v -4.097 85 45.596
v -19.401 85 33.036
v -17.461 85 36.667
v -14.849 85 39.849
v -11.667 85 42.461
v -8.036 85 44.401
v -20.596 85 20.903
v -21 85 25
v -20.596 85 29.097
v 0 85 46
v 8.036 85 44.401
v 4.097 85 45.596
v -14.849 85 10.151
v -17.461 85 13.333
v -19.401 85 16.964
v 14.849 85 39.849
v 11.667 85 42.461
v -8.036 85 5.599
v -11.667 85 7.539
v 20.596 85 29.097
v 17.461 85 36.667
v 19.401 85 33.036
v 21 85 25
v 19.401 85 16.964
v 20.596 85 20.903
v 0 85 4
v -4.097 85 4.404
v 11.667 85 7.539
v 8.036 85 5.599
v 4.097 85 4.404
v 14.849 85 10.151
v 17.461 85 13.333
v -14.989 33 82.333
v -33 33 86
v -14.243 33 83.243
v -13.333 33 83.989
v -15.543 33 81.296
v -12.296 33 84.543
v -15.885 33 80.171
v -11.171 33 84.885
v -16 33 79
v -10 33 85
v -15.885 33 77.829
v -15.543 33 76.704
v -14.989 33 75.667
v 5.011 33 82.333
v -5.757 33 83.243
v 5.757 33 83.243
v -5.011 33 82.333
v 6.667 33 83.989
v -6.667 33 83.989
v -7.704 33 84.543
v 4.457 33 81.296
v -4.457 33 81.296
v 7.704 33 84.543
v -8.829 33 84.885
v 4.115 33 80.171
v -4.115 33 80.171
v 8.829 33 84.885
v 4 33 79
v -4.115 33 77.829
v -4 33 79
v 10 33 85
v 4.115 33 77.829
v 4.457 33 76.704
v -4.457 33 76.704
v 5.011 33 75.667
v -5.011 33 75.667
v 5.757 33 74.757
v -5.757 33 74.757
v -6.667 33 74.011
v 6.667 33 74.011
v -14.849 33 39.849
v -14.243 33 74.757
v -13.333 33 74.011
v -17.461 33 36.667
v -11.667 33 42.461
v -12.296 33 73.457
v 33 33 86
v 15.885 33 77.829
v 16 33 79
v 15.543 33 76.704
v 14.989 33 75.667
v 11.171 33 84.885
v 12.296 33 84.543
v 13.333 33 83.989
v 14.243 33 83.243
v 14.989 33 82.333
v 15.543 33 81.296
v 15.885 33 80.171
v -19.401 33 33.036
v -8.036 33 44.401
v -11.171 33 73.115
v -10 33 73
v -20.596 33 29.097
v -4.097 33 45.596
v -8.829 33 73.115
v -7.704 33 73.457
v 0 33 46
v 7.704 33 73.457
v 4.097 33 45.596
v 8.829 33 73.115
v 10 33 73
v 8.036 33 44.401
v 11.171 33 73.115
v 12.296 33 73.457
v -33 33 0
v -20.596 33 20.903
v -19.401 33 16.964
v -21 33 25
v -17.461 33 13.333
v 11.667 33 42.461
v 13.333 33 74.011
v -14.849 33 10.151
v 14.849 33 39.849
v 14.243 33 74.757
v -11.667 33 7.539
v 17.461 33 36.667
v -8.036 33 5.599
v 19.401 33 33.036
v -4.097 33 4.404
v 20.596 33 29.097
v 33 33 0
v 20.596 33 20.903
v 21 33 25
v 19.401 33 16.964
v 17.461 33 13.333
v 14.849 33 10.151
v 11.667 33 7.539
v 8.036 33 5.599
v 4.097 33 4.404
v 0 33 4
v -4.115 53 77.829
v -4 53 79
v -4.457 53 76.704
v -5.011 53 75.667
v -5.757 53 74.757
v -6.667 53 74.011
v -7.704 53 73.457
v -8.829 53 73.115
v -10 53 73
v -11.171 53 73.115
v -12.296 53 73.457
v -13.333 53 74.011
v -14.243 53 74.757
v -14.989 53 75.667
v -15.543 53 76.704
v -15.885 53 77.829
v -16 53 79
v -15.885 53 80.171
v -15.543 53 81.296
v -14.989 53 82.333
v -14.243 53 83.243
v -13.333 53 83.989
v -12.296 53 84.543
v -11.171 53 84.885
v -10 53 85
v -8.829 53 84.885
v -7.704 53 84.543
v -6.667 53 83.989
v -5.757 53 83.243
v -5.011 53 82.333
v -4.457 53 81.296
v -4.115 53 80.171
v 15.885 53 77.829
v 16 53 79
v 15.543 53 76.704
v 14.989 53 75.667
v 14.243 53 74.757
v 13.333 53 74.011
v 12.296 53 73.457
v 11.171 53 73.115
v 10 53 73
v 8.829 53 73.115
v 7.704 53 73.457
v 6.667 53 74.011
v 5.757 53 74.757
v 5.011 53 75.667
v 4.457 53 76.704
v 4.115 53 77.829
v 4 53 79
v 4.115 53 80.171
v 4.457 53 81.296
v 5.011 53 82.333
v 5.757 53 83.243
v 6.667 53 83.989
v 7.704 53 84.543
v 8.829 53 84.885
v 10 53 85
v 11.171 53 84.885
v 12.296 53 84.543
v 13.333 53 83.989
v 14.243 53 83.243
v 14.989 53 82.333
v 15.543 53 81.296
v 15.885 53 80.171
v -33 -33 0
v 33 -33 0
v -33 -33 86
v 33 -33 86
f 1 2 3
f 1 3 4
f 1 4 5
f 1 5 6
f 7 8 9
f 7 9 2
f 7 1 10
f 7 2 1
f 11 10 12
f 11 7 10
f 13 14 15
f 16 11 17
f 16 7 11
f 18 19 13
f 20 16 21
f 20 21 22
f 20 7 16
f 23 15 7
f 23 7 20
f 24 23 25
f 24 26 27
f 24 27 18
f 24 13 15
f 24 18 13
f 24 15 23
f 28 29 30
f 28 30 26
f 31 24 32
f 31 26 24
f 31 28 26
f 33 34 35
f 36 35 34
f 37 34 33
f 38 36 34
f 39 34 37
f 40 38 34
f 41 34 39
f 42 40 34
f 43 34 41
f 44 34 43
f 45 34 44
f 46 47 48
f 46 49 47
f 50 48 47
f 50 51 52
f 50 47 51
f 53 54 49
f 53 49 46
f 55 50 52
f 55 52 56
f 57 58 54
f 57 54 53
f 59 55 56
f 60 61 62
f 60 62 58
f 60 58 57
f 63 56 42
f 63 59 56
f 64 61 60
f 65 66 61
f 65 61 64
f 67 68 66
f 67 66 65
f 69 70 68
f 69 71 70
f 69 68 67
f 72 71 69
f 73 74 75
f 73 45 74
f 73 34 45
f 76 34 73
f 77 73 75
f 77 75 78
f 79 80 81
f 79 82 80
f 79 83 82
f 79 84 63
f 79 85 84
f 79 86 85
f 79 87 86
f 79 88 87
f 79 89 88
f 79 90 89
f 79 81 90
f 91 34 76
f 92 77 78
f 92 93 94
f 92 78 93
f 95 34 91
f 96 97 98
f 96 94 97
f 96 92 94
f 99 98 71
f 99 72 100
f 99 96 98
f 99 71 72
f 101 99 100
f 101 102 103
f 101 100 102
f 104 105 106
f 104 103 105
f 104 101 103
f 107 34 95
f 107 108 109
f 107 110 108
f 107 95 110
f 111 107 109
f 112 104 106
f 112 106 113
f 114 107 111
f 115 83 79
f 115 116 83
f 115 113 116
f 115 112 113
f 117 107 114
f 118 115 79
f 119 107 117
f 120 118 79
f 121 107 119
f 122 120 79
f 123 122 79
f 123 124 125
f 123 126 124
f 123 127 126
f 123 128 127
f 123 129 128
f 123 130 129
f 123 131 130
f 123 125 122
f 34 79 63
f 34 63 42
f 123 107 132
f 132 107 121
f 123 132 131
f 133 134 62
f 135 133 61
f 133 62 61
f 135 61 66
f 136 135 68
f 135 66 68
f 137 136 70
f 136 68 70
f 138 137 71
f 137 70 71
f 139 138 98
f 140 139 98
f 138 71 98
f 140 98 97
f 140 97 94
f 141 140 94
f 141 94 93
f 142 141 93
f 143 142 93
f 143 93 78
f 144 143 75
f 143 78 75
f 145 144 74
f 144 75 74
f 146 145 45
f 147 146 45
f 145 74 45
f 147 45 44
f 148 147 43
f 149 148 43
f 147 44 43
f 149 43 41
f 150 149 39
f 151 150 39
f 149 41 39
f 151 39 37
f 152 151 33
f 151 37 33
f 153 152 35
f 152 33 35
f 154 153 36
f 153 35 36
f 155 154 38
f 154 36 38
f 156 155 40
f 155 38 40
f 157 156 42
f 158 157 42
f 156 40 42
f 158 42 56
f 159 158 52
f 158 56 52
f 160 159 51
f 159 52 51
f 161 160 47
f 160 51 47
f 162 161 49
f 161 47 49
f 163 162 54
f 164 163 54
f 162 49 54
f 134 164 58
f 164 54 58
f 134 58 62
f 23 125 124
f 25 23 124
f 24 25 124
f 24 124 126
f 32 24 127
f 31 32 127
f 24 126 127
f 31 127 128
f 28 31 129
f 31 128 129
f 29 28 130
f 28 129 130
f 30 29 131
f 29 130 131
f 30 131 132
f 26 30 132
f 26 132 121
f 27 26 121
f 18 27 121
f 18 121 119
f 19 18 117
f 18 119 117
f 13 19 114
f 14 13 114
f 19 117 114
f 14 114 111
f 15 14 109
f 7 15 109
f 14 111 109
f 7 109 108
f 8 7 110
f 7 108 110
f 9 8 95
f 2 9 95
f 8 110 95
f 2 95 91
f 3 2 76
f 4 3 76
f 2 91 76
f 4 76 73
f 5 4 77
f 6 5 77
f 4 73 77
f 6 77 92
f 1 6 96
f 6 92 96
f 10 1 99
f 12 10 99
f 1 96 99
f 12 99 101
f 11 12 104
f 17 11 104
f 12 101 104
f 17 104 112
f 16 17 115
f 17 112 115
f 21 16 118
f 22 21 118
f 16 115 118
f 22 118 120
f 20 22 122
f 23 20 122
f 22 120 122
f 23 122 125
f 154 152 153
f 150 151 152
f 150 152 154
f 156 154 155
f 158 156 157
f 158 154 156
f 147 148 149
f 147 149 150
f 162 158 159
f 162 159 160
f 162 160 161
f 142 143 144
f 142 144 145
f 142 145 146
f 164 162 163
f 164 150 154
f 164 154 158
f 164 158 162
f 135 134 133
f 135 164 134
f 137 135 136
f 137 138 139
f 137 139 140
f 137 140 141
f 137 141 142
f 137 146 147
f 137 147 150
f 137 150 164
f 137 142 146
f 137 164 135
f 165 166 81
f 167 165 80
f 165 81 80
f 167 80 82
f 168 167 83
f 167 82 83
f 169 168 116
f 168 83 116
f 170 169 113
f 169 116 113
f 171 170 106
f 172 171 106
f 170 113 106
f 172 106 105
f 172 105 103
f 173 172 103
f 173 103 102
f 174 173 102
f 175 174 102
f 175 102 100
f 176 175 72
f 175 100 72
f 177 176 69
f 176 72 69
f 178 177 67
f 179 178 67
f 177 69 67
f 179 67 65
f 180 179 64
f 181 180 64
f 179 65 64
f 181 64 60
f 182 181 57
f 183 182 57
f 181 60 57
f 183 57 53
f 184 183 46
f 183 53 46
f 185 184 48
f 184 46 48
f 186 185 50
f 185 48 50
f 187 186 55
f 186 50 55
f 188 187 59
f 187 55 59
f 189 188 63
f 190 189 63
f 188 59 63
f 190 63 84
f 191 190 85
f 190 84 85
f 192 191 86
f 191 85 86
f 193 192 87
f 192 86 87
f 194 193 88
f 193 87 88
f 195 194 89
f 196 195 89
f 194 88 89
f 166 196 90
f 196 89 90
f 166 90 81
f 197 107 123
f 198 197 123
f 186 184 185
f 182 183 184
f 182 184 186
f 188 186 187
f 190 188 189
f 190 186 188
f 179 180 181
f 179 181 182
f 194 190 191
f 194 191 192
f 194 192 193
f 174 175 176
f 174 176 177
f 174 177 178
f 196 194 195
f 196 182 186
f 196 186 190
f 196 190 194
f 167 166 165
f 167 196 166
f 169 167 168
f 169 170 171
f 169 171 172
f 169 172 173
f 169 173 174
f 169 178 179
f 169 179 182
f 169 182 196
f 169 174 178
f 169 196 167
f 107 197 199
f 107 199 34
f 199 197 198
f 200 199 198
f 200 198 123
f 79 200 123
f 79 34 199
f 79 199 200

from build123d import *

# Parameters (mm, degrees)
SKETCH_1_W      = 66
SKETCH_1_H      = 66
EXTRUDE_1_DEPTH = 86
SKETCH_2_R      = 21
EXTRUDE_2_DEPTH = 52
SKETCH_3_R      = 6
EXTRUDE_3_DEPTH = 20


with BuildPart() as part:
    # 草图1 → 凸台-拉伸1 (new body)
    with BuildSketch(Plane.XY):
        Rectangle(SKETCH_1_W, SKETCH_1_H)
    extrude(amount=EXTRUDE_1_DEPTH)

    # 草图2 → 凸台-拉伸2 (add)
    with BuildSketch(Plane(origin=(0, 33, 0), x_dir=(1, 0, 0), z_dir=(0, 1, 0))):
        with Locations((0, -25)):
            Circle(SKETCH_2_R)
    extrude(amount=EXTRUDE_2_DEPTH)

    # 草图3 → 凸台-拉伸3 (add)
    with BuildSketch(Plane(origin=(0, 33, 0), x_dir=(1, 0, 0), z_dir=(0, 1, 0))):
        with Locations((-10, -79)):
            Circle(SKETCH_3_R)
        with Locations((10, -79)):
            Circle(SKETCH_3_R)
    extrude(amount=EXTRUDE_3_DEPTH)


solid = part.part
